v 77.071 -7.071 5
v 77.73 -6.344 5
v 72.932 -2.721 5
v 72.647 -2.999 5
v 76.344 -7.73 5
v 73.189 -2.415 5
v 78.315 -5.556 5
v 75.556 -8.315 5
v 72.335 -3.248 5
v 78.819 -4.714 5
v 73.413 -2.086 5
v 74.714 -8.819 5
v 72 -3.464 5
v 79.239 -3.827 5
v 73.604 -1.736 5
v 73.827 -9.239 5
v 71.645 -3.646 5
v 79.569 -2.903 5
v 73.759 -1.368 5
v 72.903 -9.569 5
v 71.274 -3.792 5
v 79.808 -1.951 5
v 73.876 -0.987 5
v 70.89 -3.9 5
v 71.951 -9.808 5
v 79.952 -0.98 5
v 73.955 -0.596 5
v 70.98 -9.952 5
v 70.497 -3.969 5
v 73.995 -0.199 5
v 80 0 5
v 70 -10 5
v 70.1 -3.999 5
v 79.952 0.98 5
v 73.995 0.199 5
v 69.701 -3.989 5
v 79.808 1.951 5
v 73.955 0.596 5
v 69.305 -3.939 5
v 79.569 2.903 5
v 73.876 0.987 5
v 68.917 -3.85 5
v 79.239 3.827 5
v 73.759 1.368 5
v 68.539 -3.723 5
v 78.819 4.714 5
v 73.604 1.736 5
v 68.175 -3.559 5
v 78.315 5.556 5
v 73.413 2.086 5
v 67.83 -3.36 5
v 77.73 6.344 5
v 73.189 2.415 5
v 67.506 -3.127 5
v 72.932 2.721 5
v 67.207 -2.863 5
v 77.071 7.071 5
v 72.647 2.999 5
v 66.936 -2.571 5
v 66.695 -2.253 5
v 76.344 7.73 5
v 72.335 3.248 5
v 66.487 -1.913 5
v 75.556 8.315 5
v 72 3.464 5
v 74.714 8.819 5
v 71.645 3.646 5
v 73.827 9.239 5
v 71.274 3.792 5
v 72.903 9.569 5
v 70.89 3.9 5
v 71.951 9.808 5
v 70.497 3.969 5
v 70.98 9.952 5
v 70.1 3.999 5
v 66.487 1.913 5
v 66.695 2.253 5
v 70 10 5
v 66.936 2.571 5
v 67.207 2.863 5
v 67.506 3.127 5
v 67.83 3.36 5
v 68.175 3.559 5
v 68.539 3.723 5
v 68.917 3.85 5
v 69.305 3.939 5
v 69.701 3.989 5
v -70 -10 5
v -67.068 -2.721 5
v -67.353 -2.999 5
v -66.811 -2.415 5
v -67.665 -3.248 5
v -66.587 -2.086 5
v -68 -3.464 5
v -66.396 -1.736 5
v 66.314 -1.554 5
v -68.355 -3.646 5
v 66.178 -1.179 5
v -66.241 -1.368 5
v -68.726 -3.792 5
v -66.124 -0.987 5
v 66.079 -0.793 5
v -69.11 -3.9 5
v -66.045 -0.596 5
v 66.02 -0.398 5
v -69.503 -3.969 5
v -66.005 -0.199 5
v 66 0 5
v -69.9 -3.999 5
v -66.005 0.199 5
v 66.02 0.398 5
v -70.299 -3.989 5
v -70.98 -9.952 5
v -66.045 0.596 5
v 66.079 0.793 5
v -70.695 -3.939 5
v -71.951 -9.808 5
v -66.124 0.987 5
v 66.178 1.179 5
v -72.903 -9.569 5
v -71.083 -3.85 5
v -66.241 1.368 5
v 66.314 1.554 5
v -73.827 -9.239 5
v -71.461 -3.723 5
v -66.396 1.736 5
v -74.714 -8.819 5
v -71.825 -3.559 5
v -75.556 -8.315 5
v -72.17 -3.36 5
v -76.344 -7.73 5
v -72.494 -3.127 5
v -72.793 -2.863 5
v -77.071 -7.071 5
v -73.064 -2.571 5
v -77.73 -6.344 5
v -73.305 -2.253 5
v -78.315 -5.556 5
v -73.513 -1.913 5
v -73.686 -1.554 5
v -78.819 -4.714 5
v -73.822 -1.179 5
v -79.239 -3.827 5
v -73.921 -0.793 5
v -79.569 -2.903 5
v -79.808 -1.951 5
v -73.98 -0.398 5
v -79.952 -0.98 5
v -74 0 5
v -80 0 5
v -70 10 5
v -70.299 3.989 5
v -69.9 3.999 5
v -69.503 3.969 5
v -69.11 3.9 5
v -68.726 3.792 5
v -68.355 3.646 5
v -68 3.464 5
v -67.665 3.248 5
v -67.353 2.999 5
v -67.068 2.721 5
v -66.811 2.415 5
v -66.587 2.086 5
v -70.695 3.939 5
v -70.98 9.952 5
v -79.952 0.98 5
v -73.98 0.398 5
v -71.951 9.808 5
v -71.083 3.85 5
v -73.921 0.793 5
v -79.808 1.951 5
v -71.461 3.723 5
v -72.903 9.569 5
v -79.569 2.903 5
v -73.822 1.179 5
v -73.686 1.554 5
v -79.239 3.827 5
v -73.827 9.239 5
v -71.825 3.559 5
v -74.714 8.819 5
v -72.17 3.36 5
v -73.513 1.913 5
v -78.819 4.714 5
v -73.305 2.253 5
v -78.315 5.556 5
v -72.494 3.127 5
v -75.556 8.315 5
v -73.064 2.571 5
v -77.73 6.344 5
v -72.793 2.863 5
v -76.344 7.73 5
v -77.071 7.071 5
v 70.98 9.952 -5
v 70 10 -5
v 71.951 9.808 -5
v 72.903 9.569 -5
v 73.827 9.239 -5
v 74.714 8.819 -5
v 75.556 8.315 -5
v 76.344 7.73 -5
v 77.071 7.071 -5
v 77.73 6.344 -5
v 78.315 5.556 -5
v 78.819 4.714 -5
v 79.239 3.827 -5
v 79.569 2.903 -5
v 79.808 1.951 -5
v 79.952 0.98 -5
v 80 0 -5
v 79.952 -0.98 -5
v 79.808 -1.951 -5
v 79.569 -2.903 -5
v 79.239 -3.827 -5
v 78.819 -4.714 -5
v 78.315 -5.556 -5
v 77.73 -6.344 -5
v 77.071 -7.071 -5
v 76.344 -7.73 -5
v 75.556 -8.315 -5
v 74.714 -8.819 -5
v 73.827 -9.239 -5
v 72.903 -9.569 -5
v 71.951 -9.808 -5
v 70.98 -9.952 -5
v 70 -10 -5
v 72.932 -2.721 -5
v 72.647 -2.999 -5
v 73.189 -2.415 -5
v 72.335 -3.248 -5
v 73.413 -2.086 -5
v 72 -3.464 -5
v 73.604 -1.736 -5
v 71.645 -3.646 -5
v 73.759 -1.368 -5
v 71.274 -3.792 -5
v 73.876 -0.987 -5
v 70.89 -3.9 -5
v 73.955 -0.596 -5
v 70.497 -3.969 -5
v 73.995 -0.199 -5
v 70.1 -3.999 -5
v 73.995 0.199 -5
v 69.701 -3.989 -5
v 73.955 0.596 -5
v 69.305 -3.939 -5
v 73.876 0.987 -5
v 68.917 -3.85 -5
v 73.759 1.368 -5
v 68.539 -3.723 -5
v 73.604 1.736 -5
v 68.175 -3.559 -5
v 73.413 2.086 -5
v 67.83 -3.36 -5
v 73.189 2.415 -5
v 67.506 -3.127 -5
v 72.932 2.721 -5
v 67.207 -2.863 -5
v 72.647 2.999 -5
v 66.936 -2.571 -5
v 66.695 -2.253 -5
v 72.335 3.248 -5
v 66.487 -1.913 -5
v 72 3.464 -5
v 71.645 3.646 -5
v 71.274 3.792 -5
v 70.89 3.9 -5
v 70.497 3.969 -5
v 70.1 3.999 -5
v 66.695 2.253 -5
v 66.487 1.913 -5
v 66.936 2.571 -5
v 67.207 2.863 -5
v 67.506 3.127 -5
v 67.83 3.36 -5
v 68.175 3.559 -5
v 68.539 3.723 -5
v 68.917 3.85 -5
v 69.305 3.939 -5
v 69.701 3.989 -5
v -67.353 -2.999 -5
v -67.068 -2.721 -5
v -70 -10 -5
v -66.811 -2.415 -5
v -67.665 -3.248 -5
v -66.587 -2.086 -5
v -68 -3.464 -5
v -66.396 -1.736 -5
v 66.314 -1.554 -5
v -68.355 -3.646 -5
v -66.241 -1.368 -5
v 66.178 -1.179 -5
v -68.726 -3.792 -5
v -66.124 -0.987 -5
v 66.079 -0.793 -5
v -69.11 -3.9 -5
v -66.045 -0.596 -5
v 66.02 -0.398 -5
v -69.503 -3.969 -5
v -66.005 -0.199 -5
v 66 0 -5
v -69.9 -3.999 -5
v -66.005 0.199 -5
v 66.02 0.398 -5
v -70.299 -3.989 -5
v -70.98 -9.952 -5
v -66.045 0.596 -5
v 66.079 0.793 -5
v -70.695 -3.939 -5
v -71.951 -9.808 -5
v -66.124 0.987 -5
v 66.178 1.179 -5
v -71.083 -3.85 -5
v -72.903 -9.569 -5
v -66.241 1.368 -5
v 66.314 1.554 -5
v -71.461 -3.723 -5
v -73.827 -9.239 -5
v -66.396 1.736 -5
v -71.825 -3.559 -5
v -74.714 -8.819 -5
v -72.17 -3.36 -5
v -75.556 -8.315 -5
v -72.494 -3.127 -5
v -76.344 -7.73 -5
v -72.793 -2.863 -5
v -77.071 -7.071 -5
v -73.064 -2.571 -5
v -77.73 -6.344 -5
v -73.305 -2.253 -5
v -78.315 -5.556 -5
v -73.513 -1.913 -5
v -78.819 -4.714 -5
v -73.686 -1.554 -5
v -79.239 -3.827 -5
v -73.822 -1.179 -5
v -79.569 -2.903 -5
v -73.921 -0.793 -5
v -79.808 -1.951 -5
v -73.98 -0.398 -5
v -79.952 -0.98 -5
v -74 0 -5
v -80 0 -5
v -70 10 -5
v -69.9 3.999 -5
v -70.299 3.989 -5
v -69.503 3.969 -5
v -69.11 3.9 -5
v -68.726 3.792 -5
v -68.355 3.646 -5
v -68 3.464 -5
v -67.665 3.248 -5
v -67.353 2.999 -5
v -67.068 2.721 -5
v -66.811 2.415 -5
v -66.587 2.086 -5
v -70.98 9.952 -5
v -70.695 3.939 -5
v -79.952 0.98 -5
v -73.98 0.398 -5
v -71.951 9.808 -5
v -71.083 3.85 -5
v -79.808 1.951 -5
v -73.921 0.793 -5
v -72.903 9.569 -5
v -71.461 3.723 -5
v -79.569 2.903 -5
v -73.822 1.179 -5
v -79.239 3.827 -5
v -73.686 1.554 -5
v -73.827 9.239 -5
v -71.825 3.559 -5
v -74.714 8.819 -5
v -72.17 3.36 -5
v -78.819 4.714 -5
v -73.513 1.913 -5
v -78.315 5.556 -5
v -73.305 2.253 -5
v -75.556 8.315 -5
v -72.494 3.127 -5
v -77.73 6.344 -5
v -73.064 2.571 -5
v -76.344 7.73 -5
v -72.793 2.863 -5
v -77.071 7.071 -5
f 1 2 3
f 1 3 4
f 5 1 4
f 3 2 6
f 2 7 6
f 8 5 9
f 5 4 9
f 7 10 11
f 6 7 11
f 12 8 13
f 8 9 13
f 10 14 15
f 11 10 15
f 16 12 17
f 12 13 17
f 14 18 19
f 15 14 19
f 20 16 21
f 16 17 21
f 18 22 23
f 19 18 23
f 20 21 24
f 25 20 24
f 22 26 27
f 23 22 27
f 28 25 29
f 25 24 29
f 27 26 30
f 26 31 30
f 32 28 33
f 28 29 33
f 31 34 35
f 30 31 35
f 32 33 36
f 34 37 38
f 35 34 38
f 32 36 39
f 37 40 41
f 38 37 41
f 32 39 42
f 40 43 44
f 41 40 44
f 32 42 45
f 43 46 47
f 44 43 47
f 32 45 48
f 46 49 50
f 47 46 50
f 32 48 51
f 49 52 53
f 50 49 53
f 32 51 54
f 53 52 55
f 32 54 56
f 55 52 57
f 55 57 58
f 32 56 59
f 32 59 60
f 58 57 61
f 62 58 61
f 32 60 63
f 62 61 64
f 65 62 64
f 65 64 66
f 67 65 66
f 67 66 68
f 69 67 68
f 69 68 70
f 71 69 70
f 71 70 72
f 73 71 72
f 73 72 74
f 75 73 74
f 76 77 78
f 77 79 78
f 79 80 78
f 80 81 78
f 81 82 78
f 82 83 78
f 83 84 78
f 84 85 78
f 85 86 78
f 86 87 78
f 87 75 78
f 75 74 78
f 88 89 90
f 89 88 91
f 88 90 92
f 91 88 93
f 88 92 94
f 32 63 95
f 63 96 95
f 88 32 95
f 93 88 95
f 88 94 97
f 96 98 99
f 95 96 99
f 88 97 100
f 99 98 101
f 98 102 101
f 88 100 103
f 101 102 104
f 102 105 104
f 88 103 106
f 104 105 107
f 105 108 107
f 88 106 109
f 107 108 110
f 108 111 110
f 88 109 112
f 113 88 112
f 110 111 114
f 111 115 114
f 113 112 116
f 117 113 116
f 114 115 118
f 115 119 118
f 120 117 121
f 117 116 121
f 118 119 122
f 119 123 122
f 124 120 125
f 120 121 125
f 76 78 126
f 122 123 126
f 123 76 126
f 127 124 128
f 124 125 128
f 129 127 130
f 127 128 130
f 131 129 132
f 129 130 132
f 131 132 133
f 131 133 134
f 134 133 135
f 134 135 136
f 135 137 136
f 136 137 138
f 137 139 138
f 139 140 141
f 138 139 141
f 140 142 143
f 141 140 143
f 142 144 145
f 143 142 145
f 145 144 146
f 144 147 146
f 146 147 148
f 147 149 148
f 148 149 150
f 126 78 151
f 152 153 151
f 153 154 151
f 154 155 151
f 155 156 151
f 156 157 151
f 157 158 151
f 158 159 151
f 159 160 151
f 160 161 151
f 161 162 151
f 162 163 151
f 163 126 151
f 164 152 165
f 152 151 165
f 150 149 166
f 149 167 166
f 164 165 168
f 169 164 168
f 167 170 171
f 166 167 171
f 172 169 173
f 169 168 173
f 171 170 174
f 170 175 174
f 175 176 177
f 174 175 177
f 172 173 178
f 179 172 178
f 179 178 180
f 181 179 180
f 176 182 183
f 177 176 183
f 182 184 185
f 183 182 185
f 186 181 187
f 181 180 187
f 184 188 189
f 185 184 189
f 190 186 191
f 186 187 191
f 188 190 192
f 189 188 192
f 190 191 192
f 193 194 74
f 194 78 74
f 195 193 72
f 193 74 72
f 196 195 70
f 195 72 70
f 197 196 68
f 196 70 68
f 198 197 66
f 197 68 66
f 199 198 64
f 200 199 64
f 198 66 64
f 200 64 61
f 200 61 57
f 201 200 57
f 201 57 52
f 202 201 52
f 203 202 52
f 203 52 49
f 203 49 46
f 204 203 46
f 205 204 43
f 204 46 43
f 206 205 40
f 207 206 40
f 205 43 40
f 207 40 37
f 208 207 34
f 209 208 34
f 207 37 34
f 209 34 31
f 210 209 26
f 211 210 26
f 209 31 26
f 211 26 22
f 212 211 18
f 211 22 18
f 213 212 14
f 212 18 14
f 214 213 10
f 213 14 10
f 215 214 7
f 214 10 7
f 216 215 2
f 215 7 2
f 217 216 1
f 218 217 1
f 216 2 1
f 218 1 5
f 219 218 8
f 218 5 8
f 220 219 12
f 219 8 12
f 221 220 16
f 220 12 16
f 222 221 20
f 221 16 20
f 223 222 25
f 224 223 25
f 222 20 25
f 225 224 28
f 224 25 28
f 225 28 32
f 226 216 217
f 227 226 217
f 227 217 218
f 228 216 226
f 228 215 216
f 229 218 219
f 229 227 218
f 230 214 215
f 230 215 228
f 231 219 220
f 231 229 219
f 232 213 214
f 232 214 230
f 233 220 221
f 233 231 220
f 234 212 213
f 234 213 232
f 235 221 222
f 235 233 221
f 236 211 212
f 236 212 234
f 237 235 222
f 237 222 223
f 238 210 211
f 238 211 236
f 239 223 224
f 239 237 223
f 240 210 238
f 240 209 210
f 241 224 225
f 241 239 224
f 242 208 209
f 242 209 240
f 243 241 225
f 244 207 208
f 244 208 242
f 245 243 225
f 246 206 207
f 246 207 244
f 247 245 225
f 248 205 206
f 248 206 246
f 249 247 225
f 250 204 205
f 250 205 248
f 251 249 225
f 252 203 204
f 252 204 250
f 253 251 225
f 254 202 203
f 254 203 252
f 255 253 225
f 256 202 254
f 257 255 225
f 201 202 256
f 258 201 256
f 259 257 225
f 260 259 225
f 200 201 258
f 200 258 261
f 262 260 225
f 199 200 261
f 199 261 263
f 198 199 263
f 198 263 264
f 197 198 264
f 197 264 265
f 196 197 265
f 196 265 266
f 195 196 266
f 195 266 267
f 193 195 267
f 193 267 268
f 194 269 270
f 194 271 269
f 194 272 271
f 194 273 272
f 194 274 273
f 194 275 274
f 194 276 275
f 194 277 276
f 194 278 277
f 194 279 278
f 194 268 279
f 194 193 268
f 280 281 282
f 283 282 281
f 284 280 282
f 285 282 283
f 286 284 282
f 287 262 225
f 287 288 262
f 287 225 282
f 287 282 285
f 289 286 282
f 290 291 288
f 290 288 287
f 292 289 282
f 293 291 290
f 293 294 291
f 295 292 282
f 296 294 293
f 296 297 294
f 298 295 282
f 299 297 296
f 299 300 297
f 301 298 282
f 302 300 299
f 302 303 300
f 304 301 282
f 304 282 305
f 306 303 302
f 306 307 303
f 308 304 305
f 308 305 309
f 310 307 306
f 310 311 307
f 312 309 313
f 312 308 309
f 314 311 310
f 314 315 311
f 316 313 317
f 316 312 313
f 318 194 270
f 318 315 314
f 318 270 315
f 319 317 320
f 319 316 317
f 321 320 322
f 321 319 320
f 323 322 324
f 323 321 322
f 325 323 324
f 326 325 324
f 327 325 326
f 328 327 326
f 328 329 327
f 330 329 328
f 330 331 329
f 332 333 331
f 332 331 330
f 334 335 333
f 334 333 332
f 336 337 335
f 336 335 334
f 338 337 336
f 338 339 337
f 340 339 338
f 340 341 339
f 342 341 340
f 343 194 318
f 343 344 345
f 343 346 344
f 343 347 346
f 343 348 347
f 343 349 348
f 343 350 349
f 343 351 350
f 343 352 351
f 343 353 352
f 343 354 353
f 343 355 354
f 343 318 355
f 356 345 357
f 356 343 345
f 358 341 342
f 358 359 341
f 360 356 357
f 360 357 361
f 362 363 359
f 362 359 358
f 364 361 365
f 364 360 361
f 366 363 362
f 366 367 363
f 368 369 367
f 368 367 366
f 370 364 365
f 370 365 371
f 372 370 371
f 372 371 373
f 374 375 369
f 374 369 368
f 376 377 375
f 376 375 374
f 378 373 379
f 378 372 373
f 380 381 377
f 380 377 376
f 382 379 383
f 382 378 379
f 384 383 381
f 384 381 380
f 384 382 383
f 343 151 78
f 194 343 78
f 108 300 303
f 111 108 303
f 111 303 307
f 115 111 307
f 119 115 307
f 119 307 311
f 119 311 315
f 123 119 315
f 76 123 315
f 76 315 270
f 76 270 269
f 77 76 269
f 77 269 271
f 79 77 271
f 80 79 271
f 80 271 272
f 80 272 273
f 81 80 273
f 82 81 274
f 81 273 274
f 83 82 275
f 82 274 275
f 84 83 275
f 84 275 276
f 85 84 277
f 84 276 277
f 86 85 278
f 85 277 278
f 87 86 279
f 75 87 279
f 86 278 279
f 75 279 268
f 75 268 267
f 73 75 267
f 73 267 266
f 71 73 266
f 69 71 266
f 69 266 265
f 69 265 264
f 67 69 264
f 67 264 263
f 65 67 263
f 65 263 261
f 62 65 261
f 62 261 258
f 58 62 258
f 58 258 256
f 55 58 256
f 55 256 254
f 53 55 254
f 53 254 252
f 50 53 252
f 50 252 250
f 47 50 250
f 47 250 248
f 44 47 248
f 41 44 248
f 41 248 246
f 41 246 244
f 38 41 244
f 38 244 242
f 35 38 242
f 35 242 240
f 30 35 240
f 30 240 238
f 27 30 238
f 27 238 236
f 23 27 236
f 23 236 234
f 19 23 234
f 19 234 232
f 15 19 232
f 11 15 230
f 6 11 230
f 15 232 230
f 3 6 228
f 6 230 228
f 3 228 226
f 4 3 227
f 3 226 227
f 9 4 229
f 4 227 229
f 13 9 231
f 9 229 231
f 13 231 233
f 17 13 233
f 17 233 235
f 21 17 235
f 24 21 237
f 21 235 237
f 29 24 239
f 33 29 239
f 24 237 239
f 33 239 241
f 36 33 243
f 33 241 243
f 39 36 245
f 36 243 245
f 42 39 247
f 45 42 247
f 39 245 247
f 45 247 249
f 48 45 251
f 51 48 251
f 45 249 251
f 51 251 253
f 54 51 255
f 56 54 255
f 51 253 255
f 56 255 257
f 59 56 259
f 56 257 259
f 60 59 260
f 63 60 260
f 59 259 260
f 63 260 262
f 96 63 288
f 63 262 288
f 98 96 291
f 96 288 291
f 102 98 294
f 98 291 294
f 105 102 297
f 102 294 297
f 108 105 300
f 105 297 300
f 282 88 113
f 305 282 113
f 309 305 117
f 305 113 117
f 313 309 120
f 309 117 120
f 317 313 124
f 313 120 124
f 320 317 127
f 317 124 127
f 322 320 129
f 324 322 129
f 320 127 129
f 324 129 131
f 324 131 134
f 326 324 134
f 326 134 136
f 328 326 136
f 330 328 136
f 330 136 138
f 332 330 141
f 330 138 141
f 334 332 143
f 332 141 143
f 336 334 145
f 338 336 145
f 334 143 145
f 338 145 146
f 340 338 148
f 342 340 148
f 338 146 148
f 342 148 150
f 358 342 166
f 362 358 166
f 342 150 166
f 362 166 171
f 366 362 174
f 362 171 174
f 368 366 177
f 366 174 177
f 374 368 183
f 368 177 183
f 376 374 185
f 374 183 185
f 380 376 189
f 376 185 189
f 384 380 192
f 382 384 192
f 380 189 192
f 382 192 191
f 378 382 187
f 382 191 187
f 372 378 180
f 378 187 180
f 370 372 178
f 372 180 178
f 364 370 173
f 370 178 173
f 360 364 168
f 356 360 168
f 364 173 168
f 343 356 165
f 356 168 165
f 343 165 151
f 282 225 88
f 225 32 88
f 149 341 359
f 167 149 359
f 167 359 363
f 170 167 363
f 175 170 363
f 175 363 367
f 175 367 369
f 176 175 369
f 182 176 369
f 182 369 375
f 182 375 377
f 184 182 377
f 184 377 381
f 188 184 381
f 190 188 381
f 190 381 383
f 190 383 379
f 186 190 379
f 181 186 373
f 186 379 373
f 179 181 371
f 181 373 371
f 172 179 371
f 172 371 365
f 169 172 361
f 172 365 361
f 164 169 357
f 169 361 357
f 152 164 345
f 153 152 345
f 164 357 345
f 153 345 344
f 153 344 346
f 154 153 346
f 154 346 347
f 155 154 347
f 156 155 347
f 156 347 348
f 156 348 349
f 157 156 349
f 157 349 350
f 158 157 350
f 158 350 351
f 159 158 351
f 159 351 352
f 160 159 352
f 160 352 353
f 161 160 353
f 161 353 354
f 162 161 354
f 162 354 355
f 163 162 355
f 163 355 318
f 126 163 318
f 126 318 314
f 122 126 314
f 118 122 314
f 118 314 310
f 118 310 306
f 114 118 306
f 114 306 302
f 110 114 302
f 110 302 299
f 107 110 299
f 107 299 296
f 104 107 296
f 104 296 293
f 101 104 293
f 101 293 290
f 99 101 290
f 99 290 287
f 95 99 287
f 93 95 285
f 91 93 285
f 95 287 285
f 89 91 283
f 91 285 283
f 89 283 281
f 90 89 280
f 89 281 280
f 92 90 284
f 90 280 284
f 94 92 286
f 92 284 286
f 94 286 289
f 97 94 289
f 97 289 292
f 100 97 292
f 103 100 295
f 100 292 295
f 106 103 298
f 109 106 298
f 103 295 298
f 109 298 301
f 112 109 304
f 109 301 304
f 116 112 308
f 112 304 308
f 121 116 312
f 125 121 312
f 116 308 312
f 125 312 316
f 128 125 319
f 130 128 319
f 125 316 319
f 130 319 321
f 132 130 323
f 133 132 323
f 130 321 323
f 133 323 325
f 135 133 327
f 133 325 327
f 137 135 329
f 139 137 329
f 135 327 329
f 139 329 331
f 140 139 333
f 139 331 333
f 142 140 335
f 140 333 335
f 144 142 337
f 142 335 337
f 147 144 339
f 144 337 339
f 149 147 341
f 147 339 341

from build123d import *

# Parameters (mm, degrees)
BOSS_EXTRUDE1_DEPTH   = 5
F_8_0MM_DOWEL_HOLE1_D = 8


with BuildPart() as part:
    # Sketch1 → Boss-Extrude1 (new, symmetric)
    with BuildSketch(Plane.XY):
        with BuildLine():
            Line((-70, 10), (70, 10))
            ThreePointArc((70, 10), (80, 0), (70, -10))
            Line((70, -10), (-70, -10))
            ThreePointArc((-70, -10), (-80, 0), (-70, 10))
        make_face()
    extrude(amount=BOSS_EXTRUDE1_DEPTH, both=True)

    # Ø8.0mm Dowel Hole1 (through all)
    with Locations(Plane.XY.offset(5)):
        with Locations((-70, 0), (70, 0)):
            Hole(F_8_0MM_DOWEL_HOLE1_D / 2)


solid = part.part
